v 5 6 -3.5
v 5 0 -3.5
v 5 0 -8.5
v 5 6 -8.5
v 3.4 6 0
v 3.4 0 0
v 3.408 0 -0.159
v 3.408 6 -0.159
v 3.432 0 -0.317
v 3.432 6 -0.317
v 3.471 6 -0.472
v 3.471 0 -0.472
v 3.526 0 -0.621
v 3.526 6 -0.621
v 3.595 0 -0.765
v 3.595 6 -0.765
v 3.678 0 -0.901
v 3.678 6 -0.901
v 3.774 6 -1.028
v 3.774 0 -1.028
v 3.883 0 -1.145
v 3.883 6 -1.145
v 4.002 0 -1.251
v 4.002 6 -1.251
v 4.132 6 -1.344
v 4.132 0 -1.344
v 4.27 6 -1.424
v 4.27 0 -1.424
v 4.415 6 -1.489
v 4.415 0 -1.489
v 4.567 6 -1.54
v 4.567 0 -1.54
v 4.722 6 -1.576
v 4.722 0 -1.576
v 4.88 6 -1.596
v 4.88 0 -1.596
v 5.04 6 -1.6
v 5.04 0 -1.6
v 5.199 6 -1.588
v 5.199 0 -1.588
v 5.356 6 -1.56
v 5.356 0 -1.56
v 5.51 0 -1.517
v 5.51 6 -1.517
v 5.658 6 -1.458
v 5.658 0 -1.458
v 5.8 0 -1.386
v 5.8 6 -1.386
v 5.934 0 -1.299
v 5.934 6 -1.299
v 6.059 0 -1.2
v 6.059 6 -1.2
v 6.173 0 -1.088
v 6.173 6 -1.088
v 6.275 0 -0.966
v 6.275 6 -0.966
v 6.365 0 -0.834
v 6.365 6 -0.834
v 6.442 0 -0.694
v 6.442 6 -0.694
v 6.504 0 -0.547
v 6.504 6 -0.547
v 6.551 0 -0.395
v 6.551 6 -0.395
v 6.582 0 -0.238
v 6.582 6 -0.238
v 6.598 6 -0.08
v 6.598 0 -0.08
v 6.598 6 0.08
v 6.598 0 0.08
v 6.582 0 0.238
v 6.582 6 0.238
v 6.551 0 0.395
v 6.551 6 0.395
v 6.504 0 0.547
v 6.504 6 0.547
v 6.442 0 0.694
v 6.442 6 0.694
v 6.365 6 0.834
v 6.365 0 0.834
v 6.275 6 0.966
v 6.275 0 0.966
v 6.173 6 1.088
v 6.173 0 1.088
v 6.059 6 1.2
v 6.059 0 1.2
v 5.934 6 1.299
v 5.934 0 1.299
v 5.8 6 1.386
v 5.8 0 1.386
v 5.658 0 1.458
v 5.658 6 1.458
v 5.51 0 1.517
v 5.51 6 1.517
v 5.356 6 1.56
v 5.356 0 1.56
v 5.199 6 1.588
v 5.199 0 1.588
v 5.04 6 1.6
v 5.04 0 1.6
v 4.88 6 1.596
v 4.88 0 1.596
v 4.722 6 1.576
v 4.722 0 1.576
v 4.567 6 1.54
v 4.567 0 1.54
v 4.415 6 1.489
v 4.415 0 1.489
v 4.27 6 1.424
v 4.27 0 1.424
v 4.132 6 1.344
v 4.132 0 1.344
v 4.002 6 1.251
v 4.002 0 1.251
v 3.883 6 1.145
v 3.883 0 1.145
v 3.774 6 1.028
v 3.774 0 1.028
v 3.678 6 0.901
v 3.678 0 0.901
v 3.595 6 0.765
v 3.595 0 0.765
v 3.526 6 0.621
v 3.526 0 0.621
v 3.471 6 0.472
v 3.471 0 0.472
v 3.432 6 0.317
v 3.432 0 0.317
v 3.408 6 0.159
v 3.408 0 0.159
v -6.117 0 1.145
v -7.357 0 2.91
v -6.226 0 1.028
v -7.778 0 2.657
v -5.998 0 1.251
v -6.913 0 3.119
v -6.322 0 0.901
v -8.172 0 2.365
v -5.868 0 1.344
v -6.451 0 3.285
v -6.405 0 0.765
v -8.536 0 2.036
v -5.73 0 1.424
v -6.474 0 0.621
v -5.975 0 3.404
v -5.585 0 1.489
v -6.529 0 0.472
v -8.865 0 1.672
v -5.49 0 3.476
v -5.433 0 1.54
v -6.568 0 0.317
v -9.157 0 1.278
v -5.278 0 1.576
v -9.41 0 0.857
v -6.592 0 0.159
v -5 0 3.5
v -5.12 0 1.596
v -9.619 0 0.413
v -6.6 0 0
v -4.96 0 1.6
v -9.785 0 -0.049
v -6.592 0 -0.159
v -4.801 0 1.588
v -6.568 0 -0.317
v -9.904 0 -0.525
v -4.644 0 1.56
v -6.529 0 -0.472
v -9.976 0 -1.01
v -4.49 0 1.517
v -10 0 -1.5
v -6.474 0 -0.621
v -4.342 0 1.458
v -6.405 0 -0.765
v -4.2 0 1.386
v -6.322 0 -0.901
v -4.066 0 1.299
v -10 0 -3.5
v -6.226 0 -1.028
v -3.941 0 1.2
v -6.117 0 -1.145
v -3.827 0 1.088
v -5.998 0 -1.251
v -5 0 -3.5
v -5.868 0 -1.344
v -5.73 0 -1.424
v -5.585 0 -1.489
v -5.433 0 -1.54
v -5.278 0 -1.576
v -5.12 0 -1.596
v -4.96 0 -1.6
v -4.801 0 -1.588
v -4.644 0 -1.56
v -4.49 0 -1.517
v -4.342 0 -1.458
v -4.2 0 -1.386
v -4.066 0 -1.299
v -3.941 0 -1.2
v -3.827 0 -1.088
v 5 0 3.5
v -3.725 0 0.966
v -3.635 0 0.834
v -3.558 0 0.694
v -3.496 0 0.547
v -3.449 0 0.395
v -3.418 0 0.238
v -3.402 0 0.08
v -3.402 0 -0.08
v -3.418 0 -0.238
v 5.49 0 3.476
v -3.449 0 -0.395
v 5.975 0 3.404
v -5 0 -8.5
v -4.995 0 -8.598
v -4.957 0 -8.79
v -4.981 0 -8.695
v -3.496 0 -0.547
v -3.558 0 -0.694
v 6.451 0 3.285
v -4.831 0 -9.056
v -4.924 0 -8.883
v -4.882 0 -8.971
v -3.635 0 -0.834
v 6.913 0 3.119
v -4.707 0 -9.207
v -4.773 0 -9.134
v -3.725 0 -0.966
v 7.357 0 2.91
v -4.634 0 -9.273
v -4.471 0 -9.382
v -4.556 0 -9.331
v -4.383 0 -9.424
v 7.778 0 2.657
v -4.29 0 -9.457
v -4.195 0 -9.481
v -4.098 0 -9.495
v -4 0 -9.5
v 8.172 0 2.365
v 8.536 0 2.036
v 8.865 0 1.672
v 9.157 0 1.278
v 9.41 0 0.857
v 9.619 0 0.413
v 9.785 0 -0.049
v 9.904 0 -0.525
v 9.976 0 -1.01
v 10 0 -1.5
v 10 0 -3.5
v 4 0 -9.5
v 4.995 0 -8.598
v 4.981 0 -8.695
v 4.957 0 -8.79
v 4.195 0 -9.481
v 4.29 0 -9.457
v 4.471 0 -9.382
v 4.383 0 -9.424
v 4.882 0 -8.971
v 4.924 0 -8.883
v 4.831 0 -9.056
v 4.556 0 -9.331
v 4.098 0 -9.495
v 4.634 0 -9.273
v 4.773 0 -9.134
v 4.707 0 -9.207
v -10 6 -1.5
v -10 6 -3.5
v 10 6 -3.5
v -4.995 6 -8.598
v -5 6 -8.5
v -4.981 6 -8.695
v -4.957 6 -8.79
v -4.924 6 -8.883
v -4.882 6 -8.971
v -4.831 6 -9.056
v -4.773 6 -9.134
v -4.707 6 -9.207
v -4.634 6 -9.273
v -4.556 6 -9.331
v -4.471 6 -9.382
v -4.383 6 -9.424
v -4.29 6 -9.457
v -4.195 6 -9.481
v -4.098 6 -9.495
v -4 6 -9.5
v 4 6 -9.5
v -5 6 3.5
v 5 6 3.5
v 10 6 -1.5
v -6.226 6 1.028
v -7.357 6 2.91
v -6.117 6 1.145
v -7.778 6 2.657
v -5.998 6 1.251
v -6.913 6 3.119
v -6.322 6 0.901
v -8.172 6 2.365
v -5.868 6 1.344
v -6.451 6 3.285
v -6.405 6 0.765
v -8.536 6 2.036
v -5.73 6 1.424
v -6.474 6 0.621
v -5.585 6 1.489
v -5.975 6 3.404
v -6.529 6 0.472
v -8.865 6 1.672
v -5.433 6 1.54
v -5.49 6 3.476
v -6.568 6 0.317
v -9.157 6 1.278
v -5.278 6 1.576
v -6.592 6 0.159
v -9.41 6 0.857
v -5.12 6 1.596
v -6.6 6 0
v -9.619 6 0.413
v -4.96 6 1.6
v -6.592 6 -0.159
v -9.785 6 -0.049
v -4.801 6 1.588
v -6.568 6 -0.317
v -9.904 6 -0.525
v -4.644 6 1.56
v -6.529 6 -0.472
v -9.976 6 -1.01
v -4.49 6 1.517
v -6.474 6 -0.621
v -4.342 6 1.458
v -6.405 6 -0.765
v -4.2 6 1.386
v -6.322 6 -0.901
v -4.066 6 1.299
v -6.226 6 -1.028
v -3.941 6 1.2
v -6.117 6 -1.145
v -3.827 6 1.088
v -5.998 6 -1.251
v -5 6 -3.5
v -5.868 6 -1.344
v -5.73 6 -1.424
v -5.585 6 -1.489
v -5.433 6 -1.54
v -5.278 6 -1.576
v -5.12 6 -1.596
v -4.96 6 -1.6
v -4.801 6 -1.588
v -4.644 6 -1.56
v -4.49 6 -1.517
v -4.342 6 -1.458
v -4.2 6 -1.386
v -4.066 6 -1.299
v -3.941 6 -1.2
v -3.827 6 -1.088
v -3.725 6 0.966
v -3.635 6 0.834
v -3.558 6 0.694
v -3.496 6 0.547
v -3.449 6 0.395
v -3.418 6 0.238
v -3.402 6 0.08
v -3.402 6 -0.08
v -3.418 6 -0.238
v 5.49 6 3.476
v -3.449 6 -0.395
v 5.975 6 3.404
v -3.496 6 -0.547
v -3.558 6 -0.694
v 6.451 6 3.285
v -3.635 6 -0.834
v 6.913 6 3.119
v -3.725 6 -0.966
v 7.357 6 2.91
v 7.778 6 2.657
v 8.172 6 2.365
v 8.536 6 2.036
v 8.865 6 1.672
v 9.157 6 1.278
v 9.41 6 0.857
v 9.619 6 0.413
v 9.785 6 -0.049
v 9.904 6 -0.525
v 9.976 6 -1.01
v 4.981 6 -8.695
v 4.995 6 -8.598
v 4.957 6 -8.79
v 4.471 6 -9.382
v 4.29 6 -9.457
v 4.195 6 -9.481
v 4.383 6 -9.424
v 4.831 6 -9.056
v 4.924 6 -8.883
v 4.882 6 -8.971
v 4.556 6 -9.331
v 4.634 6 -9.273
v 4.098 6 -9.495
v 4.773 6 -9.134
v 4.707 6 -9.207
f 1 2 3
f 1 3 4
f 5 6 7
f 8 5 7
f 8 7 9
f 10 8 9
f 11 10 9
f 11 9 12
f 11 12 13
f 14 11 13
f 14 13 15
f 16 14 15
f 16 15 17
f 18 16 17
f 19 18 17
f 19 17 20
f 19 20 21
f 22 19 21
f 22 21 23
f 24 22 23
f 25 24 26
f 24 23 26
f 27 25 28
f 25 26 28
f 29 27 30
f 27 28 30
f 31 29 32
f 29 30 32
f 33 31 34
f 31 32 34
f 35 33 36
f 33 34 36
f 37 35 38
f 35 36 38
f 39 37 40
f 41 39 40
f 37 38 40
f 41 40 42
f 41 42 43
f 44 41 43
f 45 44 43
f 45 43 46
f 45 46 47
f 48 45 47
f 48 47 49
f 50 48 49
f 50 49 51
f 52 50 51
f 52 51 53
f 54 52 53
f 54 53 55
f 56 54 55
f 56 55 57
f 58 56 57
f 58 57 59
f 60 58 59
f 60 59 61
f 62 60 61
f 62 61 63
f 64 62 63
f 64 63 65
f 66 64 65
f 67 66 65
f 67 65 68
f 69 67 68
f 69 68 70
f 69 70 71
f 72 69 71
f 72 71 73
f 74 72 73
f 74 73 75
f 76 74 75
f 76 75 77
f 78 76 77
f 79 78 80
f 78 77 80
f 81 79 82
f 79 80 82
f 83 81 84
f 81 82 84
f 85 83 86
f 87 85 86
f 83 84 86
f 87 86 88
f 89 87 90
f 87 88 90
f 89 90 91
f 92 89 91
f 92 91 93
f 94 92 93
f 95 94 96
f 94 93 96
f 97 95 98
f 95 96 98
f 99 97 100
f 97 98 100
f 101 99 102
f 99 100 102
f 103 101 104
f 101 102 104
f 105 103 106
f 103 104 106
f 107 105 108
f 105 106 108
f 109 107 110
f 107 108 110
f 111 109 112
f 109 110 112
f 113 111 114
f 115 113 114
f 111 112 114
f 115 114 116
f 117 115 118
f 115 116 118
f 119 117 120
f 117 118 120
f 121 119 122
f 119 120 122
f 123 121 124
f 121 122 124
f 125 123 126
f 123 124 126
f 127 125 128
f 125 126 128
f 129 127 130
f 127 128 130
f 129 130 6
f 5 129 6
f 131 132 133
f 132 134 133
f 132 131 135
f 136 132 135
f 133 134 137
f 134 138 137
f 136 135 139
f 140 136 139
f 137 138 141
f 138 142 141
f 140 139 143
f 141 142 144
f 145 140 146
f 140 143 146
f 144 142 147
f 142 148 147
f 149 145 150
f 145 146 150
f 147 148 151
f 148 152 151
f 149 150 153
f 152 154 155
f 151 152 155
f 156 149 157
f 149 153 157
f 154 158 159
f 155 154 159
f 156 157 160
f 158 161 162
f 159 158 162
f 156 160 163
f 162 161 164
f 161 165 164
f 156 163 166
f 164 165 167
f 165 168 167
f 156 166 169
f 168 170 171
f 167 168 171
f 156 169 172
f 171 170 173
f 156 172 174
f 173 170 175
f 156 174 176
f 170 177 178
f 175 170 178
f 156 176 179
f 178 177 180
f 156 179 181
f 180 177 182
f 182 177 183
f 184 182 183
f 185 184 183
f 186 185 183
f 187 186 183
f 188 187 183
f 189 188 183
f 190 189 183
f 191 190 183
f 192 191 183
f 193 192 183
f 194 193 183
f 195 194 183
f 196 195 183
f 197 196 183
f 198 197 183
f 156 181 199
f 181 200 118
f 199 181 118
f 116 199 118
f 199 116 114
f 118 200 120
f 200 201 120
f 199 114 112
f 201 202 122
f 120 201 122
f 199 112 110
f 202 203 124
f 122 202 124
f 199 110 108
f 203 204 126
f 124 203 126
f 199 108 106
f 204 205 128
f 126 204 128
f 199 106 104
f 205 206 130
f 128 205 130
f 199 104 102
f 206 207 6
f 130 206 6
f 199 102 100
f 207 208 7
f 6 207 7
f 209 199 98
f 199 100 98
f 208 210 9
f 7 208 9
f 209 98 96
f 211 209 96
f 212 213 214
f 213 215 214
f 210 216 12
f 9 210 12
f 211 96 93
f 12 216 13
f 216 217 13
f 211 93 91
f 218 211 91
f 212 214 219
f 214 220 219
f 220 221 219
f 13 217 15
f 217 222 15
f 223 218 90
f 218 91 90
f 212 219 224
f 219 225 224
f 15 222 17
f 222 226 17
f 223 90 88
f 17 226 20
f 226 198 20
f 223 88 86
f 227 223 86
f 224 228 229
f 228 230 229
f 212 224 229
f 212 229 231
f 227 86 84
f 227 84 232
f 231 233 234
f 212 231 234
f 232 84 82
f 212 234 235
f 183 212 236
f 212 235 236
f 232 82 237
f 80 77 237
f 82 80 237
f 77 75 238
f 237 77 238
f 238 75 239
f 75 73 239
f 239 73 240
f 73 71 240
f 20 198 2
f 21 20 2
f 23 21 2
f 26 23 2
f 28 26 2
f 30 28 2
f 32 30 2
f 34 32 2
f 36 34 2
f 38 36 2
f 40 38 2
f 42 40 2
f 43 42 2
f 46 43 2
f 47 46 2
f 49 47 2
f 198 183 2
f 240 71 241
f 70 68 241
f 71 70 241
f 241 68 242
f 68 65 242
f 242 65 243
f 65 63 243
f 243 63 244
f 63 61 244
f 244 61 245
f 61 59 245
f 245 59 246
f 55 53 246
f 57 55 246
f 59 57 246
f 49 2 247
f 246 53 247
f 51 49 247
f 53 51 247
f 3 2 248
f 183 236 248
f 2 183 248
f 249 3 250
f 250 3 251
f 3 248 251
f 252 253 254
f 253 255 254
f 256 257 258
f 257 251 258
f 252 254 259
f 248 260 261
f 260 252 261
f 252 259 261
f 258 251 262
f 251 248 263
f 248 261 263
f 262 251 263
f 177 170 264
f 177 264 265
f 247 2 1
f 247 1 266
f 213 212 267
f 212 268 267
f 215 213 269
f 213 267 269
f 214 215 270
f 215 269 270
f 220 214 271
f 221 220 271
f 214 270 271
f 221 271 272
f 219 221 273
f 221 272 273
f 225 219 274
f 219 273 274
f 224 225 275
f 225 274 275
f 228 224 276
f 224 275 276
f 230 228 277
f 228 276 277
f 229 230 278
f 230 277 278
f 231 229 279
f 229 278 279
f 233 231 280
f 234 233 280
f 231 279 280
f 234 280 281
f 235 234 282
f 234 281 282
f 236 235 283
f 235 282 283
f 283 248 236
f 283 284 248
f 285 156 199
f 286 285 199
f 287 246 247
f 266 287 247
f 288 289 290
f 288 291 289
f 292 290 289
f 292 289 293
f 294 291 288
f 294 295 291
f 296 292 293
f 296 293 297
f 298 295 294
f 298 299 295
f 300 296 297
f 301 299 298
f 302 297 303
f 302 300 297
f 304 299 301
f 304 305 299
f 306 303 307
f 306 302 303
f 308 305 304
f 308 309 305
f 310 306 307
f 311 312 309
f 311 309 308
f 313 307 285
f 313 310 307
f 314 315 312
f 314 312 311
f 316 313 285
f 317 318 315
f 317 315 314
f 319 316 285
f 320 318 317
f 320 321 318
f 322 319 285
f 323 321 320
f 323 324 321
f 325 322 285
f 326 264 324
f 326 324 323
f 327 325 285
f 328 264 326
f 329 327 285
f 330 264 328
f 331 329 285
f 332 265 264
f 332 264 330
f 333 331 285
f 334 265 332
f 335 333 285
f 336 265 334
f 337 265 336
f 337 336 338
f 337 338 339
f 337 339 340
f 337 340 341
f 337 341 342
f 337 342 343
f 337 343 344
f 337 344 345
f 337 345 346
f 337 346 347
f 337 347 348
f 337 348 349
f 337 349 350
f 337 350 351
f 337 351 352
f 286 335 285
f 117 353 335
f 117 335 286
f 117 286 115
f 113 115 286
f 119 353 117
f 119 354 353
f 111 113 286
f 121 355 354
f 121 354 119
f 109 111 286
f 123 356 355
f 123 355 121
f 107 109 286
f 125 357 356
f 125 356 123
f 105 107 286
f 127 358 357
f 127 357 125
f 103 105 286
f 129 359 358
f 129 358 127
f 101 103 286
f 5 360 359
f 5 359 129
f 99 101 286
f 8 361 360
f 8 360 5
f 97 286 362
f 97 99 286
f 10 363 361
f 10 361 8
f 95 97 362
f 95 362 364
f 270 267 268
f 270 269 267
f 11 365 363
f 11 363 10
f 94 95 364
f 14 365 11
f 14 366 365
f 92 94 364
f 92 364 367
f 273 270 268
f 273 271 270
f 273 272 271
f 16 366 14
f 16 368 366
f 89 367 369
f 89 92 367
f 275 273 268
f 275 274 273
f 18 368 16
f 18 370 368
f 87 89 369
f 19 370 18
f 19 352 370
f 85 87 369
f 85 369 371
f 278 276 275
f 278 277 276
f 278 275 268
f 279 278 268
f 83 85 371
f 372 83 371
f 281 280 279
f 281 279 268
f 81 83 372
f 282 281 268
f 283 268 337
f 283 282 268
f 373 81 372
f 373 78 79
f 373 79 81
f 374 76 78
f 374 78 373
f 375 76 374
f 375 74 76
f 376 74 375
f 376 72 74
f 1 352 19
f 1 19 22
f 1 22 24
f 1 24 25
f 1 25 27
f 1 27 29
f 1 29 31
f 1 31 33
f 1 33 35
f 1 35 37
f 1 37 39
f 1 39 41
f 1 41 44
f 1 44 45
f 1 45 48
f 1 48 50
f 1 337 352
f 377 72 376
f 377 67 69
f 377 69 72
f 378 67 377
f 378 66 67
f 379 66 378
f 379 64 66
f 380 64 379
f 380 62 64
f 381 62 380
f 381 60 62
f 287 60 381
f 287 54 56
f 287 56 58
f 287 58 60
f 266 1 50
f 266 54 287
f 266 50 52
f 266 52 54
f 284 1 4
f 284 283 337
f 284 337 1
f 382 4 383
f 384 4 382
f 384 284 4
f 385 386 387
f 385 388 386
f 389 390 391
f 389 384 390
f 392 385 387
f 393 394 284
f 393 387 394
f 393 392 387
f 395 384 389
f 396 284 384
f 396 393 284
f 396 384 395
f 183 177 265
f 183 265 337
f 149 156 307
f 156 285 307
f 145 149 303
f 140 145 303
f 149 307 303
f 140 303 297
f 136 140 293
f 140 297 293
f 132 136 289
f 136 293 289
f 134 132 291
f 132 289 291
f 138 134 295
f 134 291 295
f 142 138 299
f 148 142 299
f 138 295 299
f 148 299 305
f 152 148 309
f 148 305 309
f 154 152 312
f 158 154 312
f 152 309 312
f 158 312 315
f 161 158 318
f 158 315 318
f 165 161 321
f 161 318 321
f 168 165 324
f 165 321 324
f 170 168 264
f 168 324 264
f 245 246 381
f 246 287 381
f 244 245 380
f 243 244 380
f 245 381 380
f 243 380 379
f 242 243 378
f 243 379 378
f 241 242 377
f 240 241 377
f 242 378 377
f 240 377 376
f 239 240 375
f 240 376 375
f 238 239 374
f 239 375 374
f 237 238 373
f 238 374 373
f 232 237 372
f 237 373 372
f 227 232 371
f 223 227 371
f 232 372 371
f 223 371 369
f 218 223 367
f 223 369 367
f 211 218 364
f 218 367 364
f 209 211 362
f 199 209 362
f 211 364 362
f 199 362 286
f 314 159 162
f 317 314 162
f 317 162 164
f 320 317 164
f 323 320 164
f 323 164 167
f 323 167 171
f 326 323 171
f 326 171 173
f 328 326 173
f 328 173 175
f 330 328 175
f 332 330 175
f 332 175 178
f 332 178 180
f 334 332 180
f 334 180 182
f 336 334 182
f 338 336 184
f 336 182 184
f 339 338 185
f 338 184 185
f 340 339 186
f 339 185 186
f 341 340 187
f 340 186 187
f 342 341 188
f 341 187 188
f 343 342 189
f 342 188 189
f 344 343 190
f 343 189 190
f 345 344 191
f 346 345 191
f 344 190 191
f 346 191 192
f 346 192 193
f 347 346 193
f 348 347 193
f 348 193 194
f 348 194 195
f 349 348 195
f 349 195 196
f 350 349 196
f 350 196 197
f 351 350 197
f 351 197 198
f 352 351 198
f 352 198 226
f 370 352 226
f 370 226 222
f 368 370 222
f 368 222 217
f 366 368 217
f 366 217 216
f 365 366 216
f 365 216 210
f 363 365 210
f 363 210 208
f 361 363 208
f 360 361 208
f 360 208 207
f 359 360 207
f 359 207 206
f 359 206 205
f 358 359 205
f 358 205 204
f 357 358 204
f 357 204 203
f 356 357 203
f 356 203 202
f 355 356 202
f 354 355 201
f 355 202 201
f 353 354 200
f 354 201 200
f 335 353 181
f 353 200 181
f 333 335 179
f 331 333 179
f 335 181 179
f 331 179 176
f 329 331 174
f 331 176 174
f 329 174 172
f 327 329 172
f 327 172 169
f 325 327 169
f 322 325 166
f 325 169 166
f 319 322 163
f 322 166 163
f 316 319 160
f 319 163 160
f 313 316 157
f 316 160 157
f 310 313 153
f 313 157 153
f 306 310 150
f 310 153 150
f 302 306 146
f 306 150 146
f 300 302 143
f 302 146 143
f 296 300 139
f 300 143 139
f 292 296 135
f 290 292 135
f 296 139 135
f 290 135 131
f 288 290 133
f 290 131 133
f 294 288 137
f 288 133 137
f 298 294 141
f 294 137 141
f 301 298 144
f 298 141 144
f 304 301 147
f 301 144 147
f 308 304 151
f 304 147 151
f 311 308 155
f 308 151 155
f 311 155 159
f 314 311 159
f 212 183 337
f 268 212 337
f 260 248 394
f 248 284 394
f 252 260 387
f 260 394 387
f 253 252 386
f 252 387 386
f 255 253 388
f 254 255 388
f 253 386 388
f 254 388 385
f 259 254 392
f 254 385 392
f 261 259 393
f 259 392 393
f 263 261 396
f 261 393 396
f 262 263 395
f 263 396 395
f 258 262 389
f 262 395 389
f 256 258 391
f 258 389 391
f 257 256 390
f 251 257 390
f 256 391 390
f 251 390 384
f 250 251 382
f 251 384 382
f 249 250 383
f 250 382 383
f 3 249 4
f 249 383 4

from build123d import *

# Parameters (mm, degrees)
SKETCH1_W             = 20
SKETCH1_H             = 7
BOSS_EXTRUDE1_DEPTH   = 6
SKETCH234_W           = 10
SKETCH234_H           = 6
BOSS_EXTRUDE234_DEPTH = 6
FILLET134_R           = 1
M3_CLEARANCE_HOLE1_D  = 3.2
FILLET135_R           = 5


with BuildPart() as part:
    # Sketch1 → Boss-Extrude1 (new body)
    with BuildSketch(Plane(origin=(0, 0, 0), x_dir=(1, 0, 0), z_dir=(0, 1, 0))):
        Rectangle(SKETCH1_W, SKETCH1_H)
    extrude(amount=BOSS_EXTRUDE1_DEPTH)

    # Sketch234 → Boss-Extrude234 (add)
    with BuildSketch(Plane(origin=(0.767778608, 0, -3.5), x_dir=(-1, 0, 0), z_dir=(0, 0, -1))):
        with Locations((0.767778608, 3)):
            Rectangle(SKETCH234_W, SKETCH234_H)
    extrude(amount=BOSS_EXTRUDE234_DEPTH)

    # Fillet134
    fillet134_edges = [part.edges().sort_by_distance(p)[0] for p in [
        (5, 3, -9.5),
        (-5, 3, -9.5),
    ]]
    fillet(fillet134_edges, radius=FILLET134_R)

    # M3 Clearance Hole1 (through all)
    with Locations(Plane(origin=(0, 6, 0), x_dir=(1, 0, 0), z_dir=(0, 1, 0))):
        with Locations((-5, 0), (5, 0)):
            Hole(M3_CLEARANCE_HOLE1_D / 2)

    # Fillet135
    fillet135_edges = [part.edges().sort_by_distance(p)[0] for p in [
        (10, 3, 3.5),
        (-10, 3, 3.5),
    ]]
    fillet(fillet135_edges, radius=FILLET135_R)


solid = part.part
